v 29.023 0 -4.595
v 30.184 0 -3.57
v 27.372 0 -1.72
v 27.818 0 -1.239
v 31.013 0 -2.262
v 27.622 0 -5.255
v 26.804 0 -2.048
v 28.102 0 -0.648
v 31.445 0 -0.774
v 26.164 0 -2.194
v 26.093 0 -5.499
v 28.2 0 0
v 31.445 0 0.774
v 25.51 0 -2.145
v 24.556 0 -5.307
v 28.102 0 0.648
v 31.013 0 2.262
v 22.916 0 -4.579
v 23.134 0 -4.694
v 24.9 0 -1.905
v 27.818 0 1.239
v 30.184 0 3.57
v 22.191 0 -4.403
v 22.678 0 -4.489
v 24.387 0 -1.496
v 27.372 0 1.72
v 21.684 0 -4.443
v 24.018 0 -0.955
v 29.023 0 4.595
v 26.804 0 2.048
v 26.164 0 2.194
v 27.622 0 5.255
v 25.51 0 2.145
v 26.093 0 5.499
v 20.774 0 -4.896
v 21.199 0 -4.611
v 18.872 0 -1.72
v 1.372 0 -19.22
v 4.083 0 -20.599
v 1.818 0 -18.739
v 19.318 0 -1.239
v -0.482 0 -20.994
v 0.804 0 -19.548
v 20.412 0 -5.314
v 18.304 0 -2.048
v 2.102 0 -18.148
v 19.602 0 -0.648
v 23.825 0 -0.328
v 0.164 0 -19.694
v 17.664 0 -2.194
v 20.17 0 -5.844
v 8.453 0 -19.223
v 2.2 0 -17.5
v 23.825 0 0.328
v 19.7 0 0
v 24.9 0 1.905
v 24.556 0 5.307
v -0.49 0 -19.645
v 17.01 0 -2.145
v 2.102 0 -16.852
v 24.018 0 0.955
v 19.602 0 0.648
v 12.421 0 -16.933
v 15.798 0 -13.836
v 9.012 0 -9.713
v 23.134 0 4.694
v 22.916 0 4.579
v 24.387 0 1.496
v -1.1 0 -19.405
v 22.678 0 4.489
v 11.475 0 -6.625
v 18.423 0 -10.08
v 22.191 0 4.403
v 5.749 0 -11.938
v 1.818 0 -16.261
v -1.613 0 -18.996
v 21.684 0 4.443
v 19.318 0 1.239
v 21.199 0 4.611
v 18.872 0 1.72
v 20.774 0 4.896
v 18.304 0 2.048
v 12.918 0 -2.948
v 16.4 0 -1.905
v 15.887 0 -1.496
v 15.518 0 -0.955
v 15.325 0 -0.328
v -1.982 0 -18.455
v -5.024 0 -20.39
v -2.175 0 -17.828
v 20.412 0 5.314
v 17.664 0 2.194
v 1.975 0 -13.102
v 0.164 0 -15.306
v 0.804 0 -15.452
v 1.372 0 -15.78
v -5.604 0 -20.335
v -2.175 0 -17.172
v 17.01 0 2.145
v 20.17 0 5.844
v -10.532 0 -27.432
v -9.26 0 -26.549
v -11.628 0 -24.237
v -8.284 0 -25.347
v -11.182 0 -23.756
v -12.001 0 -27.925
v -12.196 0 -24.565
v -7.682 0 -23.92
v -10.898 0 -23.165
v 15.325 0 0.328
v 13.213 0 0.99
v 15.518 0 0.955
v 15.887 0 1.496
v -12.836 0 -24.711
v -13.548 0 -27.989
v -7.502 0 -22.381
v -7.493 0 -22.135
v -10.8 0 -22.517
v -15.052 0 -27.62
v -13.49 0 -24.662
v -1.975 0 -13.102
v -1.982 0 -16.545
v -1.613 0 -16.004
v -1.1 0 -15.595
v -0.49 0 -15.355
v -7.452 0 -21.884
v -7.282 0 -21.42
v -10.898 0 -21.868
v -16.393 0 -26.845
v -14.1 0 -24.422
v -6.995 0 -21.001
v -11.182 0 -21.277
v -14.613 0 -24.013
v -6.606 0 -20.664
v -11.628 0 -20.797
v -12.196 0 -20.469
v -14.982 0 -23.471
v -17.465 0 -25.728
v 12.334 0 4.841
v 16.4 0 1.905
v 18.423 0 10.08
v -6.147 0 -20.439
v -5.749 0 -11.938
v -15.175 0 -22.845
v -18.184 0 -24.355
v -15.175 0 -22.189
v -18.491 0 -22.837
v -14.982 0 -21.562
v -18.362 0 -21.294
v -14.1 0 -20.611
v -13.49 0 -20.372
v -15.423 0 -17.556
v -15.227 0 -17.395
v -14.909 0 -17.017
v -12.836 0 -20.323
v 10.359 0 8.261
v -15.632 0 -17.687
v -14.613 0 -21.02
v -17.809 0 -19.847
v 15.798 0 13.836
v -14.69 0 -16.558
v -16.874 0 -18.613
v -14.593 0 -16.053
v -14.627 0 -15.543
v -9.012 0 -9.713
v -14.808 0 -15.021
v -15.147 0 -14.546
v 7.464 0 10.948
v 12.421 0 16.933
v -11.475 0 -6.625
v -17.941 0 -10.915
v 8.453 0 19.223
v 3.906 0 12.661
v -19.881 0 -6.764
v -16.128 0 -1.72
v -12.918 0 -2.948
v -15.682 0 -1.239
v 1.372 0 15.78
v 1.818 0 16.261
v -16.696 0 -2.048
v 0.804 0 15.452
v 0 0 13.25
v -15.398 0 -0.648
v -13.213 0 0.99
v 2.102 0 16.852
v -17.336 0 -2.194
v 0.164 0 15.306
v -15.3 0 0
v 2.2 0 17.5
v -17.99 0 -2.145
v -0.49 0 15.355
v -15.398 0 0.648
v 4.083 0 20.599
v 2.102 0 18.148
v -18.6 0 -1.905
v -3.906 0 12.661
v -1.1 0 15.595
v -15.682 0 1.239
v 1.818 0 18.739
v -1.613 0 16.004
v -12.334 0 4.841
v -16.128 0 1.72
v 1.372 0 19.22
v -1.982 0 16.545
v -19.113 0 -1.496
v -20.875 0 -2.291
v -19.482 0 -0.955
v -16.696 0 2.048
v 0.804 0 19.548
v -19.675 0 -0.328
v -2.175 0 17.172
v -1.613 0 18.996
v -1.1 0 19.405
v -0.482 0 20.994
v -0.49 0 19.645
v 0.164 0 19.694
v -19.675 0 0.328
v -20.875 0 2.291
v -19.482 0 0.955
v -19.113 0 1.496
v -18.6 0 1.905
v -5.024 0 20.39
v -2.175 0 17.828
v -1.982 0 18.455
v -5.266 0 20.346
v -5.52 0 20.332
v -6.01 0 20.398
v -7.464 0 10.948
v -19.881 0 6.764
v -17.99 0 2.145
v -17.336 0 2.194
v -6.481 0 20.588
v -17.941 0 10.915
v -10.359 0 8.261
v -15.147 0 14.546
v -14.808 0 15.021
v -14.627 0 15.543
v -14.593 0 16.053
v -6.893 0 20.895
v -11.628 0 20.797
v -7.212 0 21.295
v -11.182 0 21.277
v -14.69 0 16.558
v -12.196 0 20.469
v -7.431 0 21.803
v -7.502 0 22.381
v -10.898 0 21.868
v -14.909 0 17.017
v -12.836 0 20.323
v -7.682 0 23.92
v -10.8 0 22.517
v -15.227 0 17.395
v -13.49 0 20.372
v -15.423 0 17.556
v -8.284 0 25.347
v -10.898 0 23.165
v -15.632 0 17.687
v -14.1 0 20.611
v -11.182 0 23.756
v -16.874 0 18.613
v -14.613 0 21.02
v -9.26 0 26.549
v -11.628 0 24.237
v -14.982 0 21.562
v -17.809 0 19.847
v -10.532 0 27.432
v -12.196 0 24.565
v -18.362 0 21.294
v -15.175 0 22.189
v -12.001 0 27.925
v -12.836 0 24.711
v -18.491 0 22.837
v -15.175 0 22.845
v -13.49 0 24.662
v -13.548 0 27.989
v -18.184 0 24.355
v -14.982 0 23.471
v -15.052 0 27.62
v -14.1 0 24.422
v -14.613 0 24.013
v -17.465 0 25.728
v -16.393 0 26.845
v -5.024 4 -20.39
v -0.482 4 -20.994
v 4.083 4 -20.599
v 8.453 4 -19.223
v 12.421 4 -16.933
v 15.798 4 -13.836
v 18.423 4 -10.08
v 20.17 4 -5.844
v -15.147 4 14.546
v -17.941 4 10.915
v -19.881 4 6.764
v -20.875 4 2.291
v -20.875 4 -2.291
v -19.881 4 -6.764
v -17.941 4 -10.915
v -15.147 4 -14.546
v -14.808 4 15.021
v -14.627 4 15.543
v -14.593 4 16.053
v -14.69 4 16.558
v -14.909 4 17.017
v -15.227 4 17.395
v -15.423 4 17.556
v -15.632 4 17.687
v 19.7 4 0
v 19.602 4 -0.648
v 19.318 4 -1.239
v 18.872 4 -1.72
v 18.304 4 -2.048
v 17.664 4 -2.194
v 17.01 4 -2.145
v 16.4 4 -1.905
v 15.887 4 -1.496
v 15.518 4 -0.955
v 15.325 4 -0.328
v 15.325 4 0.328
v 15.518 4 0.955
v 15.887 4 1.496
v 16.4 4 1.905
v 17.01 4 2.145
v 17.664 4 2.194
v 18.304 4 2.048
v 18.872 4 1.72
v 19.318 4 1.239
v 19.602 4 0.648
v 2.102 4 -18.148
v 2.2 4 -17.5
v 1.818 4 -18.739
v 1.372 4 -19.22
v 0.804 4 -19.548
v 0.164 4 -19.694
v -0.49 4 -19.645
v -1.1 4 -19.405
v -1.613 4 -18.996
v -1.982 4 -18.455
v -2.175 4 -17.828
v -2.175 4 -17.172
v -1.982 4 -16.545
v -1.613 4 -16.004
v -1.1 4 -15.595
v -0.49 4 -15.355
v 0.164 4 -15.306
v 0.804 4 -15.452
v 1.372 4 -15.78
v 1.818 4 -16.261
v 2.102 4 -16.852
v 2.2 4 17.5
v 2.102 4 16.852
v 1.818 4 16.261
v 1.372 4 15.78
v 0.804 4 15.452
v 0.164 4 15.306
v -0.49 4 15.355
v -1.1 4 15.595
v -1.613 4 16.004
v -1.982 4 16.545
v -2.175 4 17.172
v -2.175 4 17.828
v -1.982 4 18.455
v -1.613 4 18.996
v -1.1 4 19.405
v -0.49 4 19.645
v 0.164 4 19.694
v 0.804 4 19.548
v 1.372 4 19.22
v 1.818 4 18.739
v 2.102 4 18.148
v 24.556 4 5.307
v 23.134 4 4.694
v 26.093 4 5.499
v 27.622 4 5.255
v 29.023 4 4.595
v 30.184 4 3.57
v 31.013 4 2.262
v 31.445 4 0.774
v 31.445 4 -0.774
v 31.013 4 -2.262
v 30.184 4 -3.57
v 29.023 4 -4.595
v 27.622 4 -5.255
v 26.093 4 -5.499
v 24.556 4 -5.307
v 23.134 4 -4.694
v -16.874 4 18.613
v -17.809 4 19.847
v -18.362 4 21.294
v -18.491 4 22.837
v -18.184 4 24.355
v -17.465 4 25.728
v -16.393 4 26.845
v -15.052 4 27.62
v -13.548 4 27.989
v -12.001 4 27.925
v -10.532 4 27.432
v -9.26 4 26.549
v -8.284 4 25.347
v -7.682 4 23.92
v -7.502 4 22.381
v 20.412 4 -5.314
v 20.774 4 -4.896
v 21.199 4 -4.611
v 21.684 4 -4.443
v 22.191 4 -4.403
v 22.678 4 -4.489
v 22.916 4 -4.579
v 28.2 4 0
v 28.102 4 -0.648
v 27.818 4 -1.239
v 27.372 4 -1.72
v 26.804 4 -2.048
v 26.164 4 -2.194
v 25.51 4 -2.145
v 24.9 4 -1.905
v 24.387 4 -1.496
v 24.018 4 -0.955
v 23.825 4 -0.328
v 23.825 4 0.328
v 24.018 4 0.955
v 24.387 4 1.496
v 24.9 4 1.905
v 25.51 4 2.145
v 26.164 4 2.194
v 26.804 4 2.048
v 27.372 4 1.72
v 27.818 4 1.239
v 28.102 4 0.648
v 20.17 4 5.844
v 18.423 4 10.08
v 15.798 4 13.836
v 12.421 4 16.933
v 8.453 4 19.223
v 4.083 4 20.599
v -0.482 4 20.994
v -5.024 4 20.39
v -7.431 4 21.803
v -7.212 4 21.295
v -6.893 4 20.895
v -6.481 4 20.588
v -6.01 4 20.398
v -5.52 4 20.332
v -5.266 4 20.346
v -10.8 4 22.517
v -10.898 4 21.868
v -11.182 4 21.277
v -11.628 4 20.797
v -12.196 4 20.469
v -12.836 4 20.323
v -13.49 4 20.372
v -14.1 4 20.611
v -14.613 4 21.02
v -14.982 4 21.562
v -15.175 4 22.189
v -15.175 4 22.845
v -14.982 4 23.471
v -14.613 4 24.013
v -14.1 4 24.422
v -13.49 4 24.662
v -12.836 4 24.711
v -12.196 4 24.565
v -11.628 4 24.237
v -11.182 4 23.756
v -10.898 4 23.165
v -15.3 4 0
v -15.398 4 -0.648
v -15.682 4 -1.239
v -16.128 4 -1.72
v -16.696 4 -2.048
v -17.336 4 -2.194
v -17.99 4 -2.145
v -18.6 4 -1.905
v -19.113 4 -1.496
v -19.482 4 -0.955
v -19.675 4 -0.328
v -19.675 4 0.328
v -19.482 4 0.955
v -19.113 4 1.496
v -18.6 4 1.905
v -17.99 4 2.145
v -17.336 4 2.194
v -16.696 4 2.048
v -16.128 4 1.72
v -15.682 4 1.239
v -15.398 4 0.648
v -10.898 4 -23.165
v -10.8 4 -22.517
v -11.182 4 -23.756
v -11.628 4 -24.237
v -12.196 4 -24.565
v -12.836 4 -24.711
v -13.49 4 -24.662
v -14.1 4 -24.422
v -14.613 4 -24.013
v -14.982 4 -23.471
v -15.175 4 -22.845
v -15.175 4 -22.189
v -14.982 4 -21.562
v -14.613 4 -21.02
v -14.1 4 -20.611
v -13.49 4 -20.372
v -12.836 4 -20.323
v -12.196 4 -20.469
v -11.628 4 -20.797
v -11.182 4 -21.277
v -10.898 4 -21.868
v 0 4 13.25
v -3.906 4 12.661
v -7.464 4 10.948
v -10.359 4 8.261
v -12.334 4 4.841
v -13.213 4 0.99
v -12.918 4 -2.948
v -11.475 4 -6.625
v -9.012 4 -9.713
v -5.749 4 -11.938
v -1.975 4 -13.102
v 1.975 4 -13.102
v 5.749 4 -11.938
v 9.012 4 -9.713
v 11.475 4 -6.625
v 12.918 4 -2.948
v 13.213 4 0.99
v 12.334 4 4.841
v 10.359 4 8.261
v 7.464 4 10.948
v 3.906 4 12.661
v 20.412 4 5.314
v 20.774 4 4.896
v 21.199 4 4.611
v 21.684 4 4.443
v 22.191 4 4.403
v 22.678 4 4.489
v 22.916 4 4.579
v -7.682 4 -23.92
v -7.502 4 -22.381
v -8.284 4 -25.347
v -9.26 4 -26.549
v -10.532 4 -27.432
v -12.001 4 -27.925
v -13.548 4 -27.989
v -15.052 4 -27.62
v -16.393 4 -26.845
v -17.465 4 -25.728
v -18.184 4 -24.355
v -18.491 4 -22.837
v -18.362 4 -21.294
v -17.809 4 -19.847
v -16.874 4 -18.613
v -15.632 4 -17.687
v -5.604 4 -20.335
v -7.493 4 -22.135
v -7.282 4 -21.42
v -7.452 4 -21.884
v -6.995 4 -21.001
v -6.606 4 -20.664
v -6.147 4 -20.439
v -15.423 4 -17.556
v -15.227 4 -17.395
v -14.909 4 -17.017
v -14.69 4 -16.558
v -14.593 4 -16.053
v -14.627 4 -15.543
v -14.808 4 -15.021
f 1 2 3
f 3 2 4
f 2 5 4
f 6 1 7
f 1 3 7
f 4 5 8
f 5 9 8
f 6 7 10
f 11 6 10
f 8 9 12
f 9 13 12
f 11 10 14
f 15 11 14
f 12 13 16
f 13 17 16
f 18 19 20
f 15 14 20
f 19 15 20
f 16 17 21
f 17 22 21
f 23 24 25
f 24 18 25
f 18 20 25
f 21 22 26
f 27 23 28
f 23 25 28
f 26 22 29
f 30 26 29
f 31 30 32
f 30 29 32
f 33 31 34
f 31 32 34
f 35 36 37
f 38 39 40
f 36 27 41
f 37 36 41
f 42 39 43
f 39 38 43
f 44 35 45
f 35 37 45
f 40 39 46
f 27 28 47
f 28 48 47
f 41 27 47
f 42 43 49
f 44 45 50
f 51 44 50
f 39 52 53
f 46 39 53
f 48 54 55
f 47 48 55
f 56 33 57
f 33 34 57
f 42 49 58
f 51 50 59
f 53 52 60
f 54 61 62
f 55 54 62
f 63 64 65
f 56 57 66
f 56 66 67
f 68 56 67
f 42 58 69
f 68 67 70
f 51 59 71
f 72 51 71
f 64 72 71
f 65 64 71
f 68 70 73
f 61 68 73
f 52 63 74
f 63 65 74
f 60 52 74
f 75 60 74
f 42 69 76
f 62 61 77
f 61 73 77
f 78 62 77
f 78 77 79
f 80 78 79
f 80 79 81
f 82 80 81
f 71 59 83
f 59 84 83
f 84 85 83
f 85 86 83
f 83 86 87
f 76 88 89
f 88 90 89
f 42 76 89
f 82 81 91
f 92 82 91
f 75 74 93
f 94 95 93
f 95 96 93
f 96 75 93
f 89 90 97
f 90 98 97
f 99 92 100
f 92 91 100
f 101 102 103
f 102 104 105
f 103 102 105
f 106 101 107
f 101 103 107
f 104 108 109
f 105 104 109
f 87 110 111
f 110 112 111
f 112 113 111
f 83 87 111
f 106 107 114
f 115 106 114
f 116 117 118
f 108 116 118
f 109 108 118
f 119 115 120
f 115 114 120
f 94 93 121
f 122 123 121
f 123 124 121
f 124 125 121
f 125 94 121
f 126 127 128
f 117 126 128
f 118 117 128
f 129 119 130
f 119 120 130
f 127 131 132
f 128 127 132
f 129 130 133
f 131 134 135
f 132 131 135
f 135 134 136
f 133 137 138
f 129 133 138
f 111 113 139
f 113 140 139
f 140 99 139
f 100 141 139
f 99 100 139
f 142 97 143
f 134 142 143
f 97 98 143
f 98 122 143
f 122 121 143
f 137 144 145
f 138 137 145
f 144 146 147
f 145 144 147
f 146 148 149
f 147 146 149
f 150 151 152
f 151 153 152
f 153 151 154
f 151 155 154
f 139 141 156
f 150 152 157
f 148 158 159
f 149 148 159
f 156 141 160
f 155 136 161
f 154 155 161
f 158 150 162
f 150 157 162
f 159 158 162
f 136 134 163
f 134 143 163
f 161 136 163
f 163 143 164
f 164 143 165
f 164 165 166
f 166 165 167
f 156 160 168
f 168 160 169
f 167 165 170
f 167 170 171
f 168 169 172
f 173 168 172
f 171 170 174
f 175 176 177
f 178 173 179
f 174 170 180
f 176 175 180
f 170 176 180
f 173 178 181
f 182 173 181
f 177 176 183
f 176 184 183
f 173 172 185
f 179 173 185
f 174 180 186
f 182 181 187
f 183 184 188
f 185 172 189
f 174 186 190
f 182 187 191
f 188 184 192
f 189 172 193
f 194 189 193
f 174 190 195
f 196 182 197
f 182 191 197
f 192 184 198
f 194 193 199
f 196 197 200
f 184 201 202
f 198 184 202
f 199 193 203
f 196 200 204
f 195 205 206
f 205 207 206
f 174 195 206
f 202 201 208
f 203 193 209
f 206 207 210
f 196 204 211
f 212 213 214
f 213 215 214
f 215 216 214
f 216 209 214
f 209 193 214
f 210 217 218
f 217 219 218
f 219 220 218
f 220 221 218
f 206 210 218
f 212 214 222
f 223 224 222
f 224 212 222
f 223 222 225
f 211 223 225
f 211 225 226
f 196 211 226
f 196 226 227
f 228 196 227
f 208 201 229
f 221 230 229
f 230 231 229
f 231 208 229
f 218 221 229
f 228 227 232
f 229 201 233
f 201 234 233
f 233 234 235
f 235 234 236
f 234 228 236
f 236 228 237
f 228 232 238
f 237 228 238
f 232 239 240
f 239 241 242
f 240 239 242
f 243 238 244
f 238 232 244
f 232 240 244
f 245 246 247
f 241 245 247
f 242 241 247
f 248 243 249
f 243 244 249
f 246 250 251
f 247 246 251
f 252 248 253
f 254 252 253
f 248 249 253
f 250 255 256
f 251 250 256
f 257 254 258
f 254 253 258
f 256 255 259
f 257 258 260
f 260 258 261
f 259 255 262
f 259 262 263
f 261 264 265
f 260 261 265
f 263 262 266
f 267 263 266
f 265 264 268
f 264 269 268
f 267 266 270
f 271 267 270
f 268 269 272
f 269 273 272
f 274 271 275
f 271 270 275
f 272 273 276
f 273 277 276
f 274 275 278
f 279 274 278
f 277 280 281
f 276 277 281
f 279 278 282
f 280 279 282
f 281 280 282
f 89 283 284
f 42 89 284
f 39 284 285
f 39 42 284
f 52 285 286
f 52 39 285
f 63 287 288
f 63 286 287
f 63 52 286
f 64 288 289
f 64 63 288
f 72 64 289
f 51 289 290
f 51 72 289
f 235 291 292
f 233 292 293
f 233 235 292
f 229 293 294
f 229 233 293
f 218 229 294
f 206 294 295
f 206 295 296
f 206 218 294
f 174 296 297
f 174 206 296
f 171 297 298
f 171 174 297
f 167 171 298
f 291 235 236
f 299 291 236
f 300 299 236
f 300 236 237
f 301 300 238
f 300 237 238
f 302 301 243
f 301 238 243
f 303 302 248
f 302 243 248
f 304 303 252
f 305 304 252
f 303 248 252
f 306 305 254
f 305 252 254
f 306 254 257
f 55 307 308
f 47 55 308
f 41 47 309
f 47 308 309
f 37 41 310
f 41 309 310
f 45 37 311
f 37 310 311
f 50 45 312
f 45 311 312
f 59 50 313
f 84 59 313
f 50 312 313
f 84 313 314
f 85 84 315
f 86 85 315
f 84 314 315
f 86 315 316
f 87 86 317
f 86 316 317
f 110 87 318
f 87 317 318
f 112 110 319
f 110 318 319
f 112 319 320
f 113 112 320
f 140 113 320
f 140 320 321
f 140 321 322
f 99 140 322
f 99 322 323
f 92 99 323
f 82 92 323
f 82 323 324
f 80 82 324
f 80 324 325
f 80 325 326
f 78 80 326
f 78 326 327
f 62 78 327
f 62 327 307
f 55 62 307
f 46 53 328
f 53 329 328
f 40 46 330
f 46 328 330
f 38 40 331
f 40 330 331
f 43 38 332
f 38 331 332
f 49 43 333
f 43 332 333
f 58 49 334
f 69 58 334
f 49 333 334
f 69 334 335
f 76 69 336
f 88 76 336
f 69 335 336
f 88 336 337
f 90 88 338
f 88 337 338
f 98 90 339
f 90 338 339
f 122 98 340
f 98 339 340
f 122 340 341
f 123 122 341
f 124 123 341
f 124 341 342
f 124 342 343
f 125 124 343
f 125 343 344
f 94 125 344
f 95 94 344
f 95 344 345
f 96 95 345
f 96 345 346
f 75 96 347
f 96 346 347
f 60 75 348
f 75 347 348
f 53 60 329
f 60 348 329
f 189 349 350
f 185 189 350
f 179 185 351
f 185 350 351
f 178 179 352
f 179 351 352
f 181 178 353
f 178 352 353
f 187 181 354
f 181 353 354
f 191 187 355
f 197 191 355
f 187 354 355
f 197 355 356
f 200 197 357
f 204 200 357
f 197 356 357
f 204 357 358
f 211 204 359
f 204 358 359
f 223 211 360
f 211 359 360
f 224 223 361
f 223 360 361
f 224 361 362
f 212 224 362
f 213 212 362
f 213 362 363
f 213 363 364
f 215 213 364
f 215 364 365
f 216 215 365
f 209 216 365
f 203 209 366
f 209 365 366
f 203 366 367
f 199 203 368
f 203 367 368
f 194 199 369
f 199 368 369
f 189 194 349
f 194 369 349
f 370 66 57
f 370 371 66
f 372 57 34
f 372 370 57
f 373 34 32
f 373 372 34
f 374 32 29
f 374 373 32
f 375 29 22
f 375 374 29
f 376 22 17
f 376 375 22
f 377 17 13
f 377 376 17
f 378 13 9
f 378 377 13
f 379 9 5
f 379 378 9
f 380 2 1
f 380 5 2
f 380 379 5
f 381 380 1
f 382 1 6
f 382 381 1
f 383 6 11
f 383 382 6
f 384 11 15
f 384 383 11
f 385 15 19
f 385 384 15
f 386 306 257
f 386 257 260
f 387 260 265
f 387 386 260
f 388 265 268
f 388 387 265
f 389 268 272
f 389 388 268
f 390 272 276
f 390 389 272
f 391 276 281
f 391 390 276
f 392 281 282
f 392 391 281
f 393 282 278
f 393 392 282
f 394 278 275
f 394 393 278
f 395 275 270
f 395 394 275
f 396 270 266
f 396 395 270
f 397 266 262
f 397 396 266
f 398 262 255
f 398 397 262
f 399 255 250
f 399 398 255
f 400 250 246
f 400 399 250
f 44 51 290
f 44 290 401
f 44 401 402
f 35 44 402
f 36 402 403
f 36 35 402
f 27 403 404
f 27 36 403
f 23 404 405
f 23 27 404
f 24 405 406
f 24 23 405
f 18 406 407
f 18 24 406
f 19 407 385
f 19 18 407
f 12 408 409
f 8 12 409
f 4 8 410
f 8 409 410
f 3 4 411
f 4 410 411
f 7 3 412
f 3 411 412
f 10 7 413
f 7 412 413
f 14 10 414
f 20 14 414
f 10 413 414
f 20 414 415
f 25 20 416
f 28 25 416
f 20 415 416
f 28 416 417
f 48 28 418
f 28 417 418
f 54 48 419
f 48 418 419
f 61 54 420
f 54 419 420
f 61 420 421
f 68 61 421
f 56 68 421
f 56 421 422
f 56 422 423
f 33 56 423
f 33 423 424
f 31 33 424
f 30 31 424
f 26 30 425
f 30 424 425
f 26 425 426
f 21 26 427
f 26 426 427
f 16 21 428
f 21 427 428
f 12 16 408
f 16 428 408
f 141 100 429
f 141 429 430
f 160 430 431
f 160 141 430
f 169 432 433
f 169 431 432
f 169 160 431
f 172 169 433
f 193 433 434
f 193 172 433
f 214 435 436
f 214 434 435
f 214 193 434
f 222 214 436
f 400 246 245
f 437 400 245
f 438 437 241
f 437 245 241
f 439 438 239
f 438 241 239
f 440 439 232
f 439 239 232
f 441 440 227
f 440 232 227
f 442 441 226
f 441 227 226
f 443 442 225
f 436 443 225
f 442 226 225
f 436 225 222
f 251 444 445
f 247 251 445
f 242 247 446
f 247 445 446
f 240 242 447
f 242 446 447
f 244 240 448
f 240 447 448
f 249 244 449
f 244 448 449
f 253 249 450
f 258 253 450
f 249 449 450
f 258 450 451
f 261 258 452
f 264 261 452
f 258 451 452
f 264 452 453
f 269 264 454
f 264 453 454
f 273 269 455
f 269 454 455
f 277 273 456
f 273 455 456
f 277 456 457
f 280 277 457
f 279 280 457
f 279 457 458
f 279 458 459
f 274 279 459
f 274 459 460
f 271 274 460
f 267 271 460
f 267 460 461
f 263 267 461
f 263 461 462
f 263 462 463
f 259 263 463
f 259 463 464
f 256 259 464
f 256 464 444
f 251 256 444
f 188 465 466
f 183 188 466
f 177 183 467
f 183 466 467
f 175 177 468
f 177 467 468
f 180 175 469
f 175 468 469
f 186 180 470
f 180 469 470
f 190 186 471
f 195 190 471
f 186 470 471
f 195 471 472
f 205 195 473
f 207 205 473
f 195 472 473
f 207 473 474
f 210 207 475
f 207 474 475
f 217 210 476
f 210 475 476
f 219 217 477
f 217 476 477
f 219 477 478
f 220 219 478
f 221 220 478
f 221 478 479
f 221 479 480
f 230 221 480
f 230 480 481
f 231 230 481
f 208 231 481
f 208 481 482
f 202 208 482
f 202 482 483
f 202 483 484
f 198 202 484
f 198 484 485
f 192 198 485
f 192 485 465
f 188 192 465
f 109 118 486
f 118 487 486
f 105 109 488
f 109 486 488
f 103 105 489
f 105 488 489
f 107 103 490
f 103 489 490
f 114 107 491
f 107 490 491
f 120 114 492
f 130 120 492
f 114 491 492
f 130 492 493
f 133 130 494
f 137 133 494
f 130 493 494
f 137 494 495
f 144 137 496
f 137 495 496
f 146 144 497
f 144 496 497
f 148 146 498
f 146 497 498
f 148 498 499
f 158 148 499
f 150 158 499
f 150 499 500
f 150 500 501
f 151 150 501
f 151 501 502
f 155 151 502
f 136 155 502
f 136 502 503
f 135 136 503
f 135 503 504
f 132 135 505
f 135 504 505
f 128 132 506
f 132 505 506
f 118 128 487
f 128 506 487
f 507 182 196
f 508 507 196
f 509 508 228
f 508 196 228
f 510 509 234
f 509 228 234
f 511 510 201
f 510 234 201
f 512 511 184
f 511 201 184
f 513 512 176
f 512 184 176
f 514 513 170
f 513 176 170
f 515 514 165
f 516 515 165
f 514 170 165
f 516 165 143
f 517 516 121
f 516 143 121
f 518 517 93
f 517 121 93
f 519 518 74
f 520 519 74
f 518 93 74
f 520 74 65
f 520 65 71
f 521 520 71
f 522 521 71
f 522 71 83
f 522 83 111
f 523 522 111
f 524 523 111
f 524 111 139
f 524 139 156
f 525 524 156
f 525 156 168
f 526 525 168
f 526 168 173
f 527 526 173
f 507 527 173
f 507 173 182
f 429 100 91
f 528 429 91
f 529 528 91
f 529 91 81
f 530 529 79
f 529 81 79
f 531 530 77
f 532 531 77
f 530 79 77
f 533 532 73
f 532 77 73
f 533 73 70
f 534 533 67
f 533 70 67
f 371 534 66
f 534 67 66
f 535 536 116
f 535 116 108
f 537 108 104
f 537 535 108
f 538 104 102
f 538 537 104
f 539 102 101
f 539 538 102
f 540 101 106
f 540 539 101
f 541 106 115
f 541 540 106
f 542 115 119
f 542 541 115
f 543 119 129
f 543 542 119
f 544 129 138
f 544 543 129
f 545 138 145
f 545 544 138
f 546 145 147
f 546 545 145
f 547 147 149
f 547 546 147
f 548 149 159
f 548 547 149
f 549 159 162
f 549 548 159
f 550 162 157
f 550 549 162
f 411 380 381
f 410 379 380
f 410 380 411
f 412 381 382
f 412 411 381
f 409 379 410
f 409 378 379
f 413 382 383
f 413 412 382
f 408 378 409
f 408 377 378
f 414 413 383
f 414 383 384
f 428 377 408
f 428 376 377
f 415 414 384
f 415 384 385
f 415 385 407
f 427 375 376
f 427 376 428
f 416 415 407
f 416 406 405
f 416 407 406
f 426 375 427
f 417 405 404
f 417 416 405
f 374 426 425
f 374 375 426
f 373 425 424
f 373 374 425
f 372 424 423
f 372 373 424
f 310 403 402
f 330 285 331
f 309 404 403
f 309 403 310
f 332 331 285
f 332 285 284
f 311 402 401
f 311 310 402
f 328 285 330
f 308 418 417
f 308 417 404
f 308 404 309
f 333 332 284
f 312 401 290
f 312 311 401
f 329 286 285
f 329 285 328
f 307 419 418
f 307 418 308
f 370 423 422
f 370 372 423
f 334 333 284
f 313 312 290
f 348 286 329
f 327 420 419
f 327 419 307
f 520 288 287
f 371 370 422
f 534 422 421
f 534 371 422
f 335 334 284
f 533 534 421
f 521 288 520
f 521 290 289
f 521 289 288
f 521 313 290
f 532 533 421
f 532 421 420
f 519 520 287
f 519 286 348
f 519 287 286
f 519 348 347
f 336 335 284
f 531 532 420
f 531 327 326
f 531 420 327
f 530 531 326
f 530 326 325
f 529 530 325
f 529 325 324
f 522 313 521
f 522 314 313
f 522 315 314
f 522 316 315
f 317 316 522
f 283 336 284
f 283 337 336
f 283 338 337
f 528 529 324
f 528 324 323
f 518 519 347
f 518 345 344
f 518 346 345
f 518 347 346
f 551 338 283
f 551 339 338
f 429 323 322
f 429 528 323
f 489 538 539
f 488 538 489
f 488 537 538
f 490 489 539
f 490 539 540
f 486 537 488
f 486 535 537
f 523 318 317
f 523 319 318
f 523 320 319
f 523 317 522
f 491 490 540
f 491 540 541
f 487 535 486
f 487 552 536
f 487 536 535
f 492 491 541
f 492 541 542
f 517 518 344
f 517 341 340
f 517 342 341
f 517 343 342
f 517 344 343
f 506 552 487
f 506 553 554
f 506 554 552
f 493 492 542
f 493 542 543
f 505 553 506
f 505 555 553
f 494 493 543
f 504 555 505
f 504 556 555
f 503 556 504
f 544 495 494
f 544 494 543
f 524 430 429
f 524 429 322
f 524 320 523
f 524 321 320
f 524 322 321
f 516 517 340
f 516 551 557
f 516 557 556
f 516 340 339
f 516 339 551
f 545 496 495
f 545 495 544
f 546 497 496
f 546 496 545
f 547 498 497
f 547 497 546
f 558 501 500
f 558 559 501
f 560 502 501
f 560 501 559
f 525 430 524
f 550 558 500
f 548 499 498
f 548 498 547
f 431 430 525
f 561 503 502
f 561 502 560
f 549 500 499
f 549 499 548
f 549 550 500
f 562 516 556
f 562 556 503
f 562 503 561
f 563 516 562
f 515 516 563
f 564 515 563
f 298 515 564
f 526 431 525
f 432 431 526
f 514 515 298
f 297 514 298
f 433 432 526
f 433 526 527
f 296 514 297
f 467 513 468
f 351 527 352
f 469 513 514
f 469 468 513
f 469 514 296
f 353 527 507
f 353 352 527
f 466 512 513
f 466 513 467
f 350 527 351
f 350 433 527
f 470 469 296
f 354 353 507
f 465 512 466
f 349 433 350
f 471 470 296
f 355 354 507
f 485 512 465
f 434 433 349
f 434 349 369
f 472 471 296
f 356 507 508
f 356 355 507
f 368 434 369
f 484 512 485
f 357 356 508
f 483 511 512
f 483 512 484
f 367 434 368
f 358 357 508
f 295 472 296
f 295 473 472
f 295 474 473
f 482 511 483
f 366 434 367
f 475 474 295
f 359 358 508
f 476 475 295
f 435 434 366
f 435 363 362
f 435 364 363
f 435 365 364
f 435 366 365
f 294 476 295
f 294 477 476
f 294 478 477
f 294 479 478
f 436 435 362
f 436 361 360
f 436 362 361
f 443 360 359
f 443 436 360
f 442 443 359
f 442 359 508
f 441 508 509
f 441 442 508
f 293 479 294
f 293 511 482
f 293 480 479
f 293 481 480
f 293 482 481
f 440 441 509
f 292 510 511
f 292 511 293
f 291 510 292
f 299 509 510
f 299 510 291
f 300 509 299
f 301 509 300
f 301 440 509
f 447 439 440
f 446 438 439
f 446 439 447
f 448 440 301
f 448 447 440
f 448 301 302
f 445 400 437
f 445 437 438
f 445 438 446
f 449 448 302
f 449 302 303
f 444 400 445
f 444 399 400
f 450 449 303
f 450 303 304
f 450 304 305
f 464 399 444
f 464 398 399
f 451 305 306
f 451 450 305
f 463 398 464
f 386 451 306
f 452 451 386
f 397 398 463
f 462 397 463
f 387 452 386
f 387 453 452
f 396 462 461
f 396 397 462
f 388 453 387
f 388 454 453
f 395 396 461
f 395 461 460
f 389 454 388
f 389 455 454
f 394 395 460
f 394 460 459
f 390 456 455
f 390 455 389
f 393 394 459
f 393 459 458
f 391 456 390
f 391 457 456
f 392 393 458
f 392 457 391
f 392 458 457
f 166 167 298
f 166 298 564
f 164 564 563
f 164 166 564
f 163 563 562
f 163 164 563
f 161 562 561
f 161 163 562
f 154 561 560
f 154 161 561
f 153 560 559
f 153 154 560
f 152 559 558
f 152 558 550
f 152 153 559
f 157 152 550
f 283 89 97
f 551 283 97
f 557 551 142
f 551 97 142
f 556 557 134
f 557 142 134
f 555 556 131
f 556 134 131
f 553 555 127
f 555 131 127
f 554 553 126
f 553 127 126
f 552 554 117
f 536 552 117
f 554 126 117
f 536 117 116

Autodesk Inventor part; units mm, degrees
ref_plane "YZ Plane" through (0, 0, 0) normal (1, 0, 0) x (0, 1, 0)
ref_plane "XZ Plane" through (0, 0, 0) normal (0, 1, 0) x (-1, 0, 0)
ref_plane "XY Plane" through (0, 0, 0) normal (0, 0, 1) x (1, 0, 0)
sketch "Sketch1" plane through (0, 0, 0) normal (0, 1, 0) x (-1, 0, 0)
  circle A0 centre (0, 0) radius 21
  dimension "d0" = 42
extrude "Extrusion1" add sketch "Sketch1" along normal blind 4
sketch "Sketch2" plane through (0, 4, 0) normal (0, 1, 0) x (1, 0, 0)
  circle A0 centre (0, 0) radius 21 projected
hole "Hole1" at (0, 4, 0) direction (0, -1, 0) diameter 26.5 end through all
sketch "Sketch3" plane through (0, 4, 0) normal (0, 1, 0) x (1, 0, 0)
  circle A0 centre (26, 0) radius 2.2
  line L0 (26, 0) -> (0, 0) construction
  circle A1 centre (26, 0) radius 5.5
  circle A2 centre (0, 0) radius 21 projected
  circle A3 centre (-13, 22.5167) radius 2.2
  circle A4 centre (-13, 22.5167) radius 5.5
  circle A5 centre (-13, -22.5167) radius 2.2
  circle A6 centre (-13, -22.5167) radius 5.5
  dimension "d10" = 4.4
  dimension "d11" = 11
  dimension "d14" = 360
  dimension "d19" = 26
extrude "Extrusion2" add sketch "Sketch3" against normal blind 4 contours A1 A2 | A2 A1 | A4 A2 | A2 A4 | A6 A2 | A2 A6
fillet "Fillet1" radius 2 6 edges at (20.899, 2, -2.0567) (20.899, 2, 2.0567) (-12.2307, 2, 17.0707) (-8.6683, 2, 19.1275) (-12.2307, 2, -17.0707) (-8.6683, 2, -19.1275)
sketch "Sketch4" plane through (0, 4, 0) normal (0, 1, 0) x (1, 0, 0)
  circle A0 centre (-17.5, 0) radius 2.2
  line L0 (-17.5, 0) -> (0, 0) construction
  circle A1 centre (0, -17.5) radius 2.2
  circle A2 centre (17.5, 0) radius 2.2
  circle A3 centre (0, 17.5) radius 2.2
  dimension "d20" = 4.4
  dimension "d22" = 17.5
  dimension "d25" = 360
extrude "Extrusion3" cut sketch "Sketch4" against normal blind 4
properties part number "775 Mounting plate" material "Aluminum 6061"
